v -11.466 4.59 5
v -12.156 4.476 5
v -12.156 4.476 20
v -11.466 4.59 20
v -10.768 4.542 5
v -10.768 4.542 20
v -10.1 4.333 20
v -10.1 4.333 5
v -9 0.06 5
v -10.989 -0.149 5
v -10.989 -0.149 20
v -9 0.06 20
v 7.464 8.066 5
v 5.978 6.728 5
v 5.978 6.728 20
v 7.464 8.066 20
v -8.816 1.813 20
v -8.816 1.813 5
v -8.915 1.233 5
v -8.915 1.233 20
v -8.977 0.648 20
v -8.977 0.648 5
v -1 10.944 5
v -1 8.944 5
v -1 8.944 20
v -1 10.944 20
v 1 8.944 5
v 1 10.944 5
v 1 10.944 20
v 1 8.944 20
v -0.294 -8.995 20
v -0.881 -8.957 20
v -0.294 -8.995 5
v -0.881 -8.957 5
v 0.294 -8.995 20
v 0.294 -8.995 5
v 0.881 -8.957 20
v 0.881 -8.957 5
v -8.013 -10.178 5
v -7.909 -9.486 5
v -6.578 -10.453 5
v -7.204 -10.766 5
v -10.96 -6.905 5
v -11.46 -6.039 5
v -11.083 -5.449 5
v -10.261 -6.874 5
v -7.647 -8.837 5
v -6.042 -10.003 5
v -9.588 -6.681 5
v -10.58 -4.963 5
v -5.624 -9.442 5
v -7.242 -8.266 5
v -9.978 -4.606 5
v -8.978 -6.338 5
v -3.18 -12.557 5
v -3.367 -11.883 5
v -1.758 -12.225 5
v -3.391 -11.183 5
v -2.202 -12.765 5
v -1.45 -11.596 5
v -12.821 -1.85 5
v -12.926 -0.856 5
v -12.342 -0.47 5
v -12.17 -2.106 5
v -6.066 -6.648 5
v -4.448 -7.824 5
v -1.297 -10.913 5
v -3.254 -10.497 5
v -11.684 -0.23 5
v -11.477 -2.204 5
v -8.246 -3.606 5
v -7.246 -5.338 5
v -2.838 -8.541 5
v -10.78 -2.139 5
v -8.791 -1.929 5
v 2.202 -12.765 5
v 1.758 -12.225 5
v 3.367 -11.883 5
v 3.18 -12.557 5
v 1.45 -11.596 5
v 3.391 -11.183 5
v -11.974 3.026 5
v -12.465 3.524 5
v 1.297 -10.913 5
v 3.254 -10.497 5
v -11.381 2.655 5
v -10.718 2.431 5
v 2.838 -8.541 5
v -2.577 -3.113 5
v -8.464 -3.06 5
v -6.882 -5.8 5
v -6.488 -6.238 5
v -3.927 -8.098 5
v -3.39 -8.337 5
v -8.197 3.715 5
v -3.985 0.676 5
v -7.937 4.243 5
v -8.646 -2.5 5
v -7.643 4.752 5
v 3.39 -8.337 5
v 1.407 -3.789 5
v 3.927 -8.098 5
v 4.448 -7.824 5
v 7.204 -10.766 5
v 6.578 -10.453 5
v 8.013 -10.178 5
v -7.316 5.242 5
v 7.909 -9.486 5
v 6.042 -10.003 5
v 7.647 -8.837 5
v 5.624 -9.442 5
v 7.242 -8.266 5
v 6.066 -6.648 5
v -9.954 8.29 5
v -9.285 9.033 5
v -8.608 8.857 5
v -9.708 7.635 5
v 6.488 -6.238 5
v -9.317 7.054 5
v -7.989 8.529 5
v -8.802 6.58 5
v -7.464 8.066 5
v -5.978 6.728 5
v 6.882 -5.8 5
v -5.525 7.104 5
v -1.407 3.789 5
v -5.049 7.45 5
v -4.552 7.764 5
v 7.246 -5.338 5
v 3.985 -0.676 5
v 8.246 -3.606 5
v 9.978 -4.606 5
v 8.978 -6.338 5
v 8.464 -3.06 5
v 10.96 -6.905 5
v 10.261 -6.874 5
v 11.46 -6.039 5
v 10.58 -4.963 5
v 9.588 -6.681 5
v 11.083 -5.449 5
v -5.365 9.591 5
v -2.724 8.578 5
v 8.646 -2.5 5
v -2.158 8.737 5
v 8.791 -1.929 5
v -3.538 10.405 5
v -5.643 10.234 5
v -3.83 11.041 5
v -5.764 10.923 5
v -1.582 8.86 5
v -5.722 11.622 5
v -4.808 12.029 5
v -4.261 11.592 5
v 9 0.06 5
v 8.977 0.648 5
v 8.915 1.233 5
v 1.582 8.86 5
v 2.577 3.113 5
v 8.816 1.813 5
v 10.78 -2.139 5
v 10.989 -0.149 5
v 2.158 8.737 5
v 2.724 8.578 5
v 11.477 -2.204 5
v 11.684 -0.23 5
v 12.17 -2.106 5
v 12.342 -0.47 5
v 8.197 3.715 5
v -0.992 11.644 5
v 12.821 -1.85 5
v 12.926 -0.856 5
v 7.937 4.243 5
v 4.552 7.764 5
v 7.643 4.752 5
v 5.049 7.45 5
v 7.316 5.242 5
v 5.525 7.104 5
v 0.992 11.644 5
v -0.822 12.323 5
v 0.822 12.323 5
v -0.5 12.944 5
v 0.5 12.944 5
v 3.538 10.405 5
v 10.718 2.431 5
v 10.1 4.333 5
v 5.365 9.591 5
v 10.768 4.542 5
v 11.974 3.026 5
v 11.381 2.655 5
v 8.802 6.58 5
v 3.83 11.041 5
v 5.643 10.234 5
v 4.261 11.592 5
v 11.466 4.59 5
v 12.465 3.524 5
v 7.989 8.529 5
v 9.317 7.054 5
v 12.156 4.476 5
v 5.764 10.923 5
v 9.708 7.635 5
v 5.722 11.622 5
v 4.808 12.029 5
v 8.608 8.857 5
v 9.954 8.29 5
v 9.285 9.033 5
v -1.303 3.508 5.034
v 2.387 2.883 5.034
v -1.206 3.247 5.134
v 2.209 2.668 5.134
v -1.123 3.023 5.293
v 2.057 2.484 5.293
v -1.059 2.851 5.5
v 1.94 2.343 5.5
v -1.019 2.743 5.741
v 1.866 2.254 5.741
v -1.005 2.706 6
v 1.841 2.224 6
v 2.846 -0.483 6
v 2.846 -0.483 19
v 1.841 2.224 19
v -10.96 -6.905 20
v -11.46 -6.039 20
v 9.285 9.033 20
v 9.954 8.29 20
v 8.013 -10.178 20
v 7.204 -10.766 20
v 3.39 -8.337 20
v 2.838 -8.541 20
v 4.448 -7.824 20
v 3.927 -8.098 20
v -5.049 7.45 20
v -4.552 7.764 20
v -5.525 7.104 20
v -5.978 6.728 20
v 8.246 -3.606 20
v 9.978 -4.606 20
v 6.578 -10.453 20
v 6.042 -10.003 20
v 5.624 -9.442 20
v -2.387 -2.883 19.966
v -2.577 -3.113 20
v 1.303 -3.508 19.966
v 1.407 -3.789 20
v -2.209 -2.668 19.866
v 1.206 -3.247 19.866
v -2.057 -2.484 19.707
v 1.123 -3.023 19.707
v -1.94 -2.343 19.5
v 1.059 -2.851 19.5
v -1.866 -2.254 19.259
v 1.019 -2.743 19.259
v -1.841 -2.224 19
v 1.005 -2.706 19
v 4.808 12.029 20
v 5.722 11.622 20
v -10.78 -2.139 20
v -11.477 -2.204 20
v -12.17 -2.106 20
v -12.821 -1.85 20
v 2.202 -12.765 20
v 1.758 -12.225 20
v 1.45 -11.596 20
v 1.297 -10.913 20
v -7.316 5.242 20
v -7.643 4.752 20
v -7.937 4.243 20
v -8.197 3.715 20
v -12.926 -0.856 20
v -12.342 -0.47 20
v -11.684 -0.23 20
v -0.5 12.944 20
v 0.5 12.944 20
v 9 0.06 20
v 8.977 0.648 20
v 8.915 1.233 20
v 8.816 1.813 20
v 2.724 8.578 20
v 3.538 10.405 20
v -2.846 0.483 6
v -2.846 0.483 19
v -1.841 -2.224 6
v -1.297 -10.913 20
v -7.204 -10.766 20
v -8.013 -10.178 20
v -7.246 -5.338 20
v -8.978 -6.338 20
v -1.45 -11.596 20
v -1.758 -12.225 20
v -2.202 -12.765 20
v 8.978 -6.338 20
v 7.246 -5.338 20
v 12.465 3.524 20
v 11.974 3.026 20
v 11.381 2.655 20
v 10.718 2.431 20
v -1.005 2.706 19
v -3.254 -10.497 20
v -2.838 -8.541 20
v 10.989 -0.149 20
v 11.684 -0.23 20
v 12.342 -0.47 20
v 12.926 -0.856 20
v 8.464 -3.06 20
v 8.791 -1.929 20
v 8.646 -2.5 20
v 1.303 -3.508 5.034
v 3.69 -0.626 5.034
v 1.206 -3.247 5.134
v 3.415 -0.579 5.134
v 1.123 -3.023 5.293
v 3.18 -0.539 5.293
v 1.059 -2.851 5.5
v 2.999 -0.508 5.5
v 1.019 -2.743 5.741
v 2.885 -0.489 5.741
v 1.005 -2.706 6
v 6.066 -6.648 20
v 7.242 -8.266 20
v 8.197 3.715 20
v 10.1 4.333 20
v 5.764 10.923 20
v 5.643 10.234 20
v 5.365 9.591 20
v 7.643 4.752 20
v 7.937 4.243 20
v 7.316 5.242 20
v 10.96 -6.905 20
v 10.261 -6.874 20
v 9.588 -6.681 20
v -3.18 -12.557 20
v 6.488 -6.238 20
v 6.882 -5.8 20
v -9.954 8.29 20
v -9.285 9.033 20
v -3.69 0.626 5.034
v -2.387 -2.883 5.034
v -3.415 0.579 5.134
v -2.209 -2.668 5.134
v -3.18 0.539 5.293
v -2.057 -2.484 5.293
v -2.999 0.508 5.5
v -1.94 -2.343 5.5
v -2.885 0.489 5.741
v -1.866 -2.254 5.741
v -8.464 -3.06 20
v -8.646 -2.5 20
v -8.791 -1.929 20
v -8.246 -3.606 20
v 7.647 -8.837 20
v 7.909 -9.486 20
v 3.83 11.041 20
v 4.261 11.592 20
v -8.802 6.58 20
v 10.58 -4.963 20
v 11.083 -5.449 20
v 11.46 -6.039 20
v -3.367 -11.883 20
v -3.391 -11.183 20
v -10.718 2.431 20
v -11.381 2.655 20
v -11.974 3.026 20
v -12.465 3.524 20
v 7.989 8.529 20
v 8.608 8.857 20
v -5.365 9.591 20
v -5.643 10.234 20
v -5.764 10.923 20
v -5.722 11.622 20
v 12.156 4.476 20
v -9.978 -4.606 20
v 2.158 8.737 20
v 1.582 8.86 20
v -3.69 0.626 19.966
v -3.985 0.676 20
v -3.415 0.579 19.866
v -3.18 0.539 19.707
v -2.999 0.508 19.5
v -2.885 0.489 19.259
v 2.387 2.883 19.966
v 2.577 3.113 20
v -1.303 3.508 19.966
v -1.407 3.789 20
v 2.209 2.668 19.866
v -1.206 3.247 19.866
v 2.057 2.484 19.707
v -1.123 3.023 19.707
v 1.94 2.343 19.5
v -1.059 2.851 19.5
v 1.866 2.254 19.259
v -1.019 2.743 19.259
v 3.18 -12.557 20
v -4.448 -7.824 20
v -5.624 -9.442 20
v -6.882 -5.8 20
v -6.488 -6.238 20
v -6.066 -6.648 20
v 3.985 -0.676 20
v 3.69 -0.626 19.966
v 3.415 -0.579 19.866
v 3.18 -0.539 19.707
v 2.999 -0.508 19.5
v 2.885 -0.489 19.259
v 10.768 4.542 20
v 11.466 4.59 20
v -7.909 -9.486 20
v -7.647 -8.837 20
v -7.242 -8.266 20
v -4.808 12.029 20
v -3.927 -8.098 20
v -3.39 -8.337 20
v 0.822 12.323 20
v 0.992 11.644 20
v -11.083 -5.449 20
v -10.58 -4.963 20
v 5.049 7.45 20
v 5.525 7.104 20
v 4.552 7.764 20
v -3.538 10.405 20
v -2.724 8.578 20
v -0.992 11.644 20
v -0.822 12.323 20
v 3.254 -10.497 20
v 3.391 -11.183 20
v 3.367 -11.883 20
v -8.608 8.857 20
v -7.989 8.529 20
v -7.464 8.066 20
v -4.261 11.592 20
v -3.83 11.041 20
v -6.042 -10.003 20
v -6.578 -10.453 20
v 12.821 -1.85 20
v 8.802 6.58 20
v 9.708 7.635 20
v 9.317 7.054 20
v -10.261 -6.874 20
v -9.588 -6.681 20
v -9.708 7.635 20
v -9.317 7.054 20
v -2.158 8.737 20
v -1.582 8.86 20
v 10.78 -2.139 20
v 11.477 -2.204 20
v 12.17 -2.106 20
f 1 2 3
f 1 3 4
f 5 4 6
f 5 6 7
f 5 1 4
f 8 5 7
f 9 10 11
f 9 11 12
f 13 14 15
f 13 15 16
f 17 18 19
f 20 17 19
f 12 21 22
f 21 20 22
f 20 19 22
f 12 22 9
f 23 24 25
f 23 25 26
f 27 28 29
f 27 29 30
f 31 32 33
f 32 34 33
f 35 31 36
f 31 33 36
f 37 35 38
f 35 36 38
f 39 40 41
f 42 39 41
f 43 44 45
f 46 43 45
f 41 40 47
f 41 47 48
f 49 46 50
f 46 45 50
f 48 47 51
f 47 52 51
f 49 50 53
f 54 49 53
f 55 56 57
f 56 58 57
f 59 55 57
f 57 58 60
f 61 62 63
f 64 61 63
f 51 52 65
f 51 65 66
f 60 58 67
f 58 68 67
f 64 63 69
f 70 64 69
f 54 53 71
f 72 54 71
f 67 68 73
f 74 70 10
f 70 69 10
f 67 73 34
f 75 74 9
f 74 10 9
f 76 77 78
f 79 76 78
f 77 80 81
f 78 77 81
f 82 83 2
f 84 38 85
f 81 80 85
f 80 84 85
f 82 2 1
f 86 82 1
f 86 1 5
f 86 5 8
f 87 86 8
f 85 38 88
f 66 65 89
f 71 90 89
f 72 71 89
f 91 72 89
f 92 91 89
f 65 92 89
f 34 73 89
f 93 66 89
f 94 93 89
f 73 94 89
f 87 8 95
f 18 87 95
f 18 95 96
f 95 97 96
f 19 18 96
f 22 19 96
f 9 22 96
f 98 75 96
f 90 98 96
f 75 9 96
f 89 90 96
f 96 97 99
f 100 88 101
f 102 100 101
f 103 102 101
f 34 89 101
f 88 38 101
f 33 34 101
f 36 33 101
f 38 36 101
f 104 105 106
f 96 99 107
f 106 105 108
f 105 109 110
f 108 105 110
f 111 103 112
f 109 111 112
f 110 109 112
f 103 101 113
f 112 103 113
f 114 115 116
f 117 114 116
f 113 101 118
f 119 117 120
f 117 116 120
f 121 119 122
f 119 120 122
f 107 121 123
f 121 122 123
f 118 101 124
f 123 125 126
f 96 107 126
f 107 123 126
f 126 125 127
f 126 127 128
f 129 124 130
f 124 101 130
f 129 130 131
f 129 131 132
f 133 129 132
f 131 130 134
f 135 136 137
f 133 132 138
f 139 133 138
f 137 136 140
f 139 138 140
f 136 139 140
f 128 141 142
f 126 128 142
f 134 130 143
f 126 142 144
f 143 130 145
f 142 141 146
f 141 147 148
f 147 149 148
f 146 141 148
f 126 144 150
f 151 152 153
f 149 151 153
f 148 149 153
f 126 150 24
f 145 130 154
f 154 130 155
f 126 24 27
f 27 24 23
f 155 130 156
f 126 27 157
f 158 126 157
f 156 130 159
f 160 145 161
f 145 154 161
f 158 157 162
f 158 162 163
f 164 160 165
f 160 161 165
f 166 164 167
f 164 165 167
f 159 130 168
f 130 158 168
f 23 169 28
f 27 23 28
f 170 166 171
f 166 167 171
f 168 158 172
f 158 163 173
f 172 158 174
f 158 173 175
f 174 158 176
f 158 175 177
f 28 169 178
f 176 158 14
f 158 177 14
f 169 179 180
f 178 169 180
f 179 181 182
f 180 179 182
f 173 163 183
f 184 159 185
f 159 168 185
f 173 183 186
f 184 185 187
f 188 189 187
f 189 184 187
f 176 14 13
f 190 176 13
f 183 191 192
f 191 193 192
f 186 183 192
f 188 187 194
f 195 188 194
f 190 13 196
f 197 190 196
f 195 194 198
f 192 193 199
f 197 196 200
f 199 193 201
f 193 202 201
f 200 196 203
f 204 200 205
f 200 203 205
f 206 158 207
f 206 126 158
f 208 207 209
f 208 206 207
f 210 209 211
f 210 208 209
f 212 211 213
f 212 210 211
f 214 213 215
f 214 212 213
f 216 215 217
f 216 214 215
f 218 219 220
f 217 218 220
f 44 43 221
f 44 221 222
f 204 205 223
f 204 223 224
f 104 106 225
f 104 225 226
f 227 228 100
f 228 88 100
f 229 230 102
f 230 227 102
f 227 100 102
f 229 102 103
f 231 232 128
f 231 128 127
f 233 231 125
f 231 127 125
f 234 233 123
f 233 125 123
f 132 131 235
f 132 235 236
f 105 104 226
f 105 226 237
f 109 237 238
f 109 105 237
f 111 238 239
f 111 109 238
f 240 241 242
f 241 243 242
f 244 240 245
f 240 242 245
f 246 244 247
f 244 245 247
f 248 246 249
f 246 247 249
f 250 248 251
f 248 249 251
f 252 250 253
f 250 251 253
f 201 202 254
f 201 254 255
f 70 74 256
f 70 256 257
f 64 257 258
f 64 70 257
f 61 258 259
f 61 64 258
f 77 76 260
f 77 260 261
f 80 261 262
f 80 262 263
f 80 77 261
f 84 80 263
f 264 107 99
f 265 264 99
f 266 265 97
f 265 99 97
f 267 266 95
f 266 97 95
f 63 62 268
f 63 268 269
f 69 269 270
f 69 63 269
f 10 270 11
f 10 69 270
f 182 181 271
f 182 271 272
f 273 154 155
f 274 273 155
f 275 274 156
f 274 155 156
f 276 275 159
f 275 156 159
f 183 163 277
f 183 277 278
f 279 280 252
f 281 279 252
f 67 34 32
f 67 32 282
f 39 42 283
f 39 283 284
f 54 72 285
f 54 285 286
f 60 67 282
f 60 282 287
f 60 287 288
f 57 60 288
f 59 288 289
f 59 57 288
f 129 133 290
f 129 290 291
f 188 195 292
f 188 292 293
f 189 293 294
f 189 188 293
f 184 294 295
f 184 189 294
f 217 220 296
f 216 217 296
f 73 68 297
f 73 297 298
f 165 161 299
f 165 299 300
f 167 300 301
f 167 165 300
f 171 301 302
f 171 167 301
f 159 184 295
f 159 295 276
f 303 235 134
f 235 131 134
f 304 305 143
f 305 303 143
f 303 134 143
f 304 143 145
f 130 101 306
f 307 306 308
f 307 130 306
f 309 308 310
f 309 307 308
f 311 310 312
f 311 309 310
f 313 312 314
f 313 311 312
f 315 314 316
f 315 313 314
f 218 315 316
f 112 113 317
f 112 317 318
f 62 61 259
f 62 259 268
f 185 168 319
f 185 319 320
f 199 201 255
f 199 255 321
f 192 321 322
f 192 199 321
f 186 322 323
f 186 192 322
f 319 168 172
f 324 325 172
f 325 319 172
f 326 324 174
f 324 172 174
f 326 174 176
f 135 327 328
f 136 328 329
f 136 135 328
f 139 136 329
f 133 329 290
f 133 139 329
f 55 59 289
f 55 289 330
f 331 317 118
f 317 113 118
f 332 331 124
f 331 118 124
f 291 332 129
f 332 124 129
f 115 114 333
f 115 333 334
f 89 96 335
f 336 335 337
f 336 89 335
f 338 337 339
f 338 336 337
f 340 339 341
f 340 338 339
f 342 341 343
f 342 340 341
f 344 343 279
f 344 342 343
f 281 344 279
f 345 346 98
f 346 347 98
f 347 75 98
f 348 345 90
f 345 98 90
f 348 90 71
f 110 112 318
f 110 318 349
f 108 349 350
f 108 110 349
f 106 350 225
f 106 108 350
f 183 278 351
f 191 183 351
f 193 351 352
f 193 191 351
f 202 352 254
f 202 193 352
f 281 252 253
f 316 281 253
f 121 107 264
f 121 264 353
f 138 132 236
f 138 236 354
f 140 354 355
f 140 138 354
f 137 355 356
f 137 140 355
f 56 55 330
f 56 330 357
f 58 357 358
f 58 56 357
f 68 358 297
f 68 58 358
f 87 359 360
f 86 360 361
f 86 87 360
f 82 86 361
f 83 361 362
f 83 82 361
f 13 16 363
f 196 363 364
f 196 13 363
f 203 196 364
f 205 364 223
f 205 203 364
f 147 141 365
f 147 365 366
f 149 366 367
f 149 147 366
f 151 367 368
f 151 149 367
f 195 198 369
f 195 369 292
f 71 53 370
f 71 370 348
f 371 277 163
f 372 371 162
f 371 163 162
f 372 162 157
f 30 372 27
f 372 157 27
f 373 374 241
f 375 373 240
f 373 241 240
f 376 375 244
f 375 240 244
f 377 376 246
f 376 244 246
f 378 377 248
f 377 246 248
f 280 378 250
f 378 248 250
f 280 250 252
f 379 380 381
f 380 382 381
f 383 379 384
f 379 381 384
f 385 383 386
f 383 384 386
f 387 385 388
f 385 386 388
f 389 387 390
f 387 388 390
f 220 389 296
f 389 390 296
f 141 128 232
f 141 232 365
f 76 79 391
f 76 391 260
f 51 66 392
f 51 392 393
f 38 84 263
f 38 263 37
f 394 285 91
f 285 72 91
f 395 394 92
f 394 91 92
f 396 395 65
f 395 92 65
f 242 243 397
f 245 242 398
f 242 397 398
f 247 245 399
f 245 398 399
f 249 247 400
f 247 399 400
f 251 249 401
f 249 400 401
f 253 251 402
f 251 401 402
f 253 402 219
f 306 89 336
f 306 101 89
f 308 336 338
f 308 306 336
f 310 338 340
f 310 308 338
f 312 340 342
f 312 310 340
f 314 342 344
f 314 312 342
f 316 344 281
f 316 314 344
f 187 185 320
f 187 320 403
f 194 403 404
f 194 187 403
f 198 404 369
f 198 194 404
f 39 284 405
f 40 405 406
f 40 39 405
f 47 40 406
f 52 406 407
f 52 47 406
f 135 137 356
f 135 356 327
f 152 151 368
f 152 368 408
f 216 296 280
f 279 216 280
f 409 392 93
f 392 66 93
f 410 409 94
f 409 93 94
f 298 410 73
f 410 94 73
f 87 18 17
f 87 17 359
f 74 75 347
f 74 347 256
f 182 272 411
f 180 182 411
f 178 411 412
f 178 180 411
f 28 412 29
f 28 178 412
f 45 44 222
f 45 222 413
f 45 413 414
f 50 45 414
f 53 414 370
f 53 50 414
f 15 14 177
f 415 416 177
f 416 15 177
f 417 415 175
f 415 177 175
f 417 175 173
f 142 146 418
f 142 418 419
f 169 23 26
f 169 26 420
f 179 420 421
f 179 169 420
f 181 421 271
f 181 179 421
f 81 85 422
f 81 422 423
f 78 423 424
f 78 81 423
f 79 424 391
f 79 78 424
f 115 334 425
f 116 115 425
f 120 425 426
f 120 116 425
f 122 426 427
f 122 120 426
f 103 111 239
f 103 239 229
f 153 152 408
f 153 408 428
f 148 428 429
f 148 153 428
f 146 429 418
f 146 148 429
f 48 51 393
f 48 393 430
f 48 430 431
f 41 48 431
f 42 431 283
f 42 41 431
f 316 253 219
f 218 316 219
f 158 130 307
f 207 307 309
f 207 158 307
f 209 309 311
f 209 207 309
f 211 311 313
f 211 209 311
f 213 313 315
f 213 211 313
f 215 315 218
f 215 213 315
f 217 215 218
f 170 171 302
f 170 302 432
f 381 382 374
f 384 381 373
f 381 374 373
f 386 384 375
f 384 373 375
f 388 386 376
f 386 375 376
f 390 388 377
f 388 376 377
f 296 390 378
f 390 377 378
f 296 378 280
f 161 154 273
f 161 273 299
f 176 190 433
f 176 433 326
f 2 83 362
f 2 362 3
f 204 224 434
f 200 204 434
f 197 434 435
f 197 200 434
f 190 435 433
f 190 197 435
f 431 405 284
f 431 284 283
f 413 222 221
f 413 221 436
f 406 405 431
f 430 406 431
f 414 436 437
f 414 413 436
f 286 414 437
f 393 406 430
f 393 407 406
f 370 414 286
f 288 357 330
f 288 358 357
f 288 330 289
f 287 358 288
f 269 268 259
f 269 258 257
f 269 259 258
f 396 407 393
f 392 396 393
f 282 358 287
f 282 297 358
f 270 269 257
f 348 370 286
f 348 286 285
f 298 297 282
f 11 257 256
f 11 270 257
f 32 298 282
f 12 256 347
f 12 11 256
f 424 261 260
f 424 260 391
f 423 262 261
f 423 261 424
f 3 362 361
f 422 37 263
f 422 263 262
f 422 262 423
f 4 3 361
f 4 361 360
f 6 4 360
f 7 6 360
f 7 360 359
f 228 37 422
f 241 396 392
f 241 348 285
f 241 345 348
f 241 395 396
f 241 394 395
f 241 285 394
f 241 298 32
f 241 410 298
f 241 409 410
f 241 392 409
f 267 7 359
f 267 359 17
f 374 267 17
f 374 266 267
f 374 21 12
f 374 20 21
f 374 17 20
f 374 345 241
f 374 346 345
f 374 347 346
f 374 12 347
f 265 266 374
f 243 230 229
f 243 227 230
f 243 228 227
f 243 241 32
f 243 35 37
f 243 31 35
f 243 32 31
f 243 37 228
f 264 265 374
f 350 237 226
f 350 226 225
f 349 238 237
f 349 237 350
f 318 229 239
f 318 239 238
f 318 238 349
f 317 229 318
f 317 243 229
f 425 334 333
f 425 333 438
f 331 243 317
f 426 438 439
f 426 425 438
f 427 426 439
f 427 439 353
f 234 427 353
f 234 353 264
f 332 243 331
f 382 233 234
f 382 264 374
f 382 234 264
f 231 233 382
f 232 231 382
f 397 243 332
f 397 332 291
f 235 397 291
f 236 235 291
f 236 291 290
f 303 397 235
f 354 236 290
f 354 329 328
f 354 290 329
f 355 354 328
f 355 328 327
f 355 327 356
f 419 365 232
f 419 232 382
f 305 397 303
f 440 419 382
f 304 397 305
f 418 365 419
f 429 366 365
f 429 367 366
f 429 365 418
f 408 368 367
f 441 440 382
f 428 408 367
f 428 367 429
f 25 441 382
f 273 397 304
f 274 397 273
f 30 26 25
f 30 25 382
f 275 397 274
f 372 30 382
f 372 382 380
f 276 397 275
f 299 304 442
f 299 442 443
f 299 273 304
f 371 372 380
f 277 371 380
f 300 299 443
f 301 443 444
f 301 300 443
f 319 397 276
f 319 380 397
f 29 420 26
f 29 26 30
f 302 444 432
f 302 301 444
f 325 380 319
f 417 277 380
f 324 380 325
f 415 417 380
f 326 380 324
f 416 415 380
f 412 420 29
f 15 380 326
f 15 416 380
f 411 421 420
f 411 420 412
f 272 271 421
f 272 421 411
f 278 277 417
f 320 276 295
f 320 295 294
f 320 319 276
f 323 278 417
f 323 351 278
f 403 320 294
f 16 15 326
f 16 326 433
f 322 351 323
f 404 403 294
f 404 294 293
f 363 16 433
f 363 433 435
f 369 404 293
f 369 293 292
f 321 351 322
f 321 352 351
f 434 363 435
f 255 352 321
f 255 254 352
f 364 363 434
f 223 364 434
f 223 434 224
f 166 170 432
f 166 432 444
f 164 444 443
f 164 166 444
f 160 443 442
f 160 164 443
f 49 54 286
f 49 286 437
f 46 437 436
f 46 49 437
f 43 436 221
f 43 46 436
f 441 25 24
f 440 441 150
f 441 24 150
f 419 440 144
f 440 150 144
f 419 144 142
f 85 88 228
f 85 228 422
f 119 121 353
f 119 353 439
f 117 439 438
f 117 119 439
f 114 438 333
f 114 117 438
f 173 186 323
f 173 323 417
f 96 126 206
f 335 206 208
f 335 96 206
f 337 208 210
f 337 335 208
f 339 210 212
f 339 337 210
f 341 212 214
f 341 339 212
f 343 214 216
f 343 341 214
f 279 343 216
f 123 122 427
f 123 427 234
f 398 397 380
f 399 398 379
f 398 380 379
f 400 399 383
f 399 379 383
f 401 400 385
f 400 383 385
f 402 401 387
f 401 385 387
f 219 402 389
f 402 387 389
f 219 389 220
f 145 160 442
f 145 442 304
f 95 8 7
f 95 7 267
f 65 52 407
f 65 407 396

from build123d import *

# Parameters (mm, degrees)
SKETCH1_R                    = 9
SKETCH1_R_2                  = 1
BOSS_EXTRUDE1_DEPTH          = 36
SKETCH5_W                    = 5
SKETCH5_H                    = 4.08502449
SKETCH5_W_2                  = 8
BOSS_EXTRUDE2_DEPTH          = 22
SKETCH7_W                    = 5
SKETCH7_H                    = 4.653899232
CUT_REVOLVE2_ANGLE           = 90
CUT_REVOLVE2_OTHER_WAY_ANGLE = 90
CIRPATTERN1_COUNT            = 15
SKETCH13_W                   = 5
SKETCH13_H                   = 16.616445935
SKETCH17_R                   = 2
CUT_EXTRUDE1_DEPTH           = 10
CUT_EXTRUDE2_DEPTH           = 23
CUT_EXTRUDE2_DEPTH_BACK      = 8
SKETCH20_R                   = 20.157813079
CUT_EXTRUDE3_DEPTH           = 36
FILLET1_R                    = 1


with BuildPart() as part:
    # Sketch1 → Boss-Extrude1 (new body)
    with BuildSketch(Plane.XY):
        Circle(SKETCH1_R)
        Circle(SKETCH1_R_2, mode=Mode.SUBTRACT)
    extrude(amount=BOSS_EXTRUDE1_DEPTH)

    # Sketch5 → Cut-Revolve1 (revolve, cut)
    with BuildSketch(Plane(origin=(0, 0, 0), x_dir=(0, 0, -1), z_dir=(1, 0, 0)), mode=Mode.PRIVATE) as cut_revolve1_sk:
        with Locations((-2.5, 6.957487755)):
            Rectangle(SKETCH5_W, SKETCH5_H)
        with Locations((-32, 6.957487755)):
            Rectangle(SKETCH5_W_2, SKETCH5_H)
    revolve(cut_revolve1_sk.sketch.rotate(Axis((0, 0, 0), (0, 0, 1)), 90), axis=Axis((0, 0, 0), (0, 0, 1)), mode=Mode.SUBTRACT)

    # Sketch6 → Boss-Extrude2 (add)
    with BuildSketch(Plane.XY):
        with BuildLine():
            Line((-1, 8.94427191), (-1, 10.94427191))
            ThreePointArc((-1, 10.94427191), (-0.927189817, 11.988569364), (-0.5, 12.94427191))
            Line((-0.5, 12.94427191), (0.5, 12.94427191))
            ThreePointArc((0.5, 12.94427191), (0.927189817, 11.988569364), (1, 10.94427191))
            Line((1, 10.94427191), (1, 8.94427191))
            Line((1, 8.94427191), (-1, 8.94427191))
        make_face()
    boss_extrude2 = extrude(amount=BOSS_EXTRUDE2_DEPTH)

    # Sketch7 → Cut-Revolve2 (revolve, cut)
    with BuildSketch(Plane(origin=(0, 0, 0), x_dir=(0, 0, -1), z_dir=(1, 0, 0))):
        with Locations((-2.5, 11.271221526)):
            Rectangle(SKETCH7_W, SKETCH7_H)
    revolve(axis=Axis((0, 8.94427191, 5), (0, 0, -1)), revolution_arc=CUT_REVOLVE2_ANGLE, mode=Mode.SUBTRACT)

    # Sketch7 → Cut-Revolve2 other way (revolve, cut)
    with BuildSketch(Plane(origin=(0, 0, 0), x_dir=(0, 0, -1), z_dir=(1, 0, 0))):
        with Locations((-2.5, 11.271221526)):
            Rectangle(SKETCH7_W, SKETCH7_H)
    revolve(axis=Axis((0, 8.94427191, 5), (0, 0, 1)), revolution_arc=CUT_REVOLVE2_OTHER_WAY_ANGLE, mode=Mode.SUBTRACT)

    # CirPattern1: Boss-Extrude2 ×15 about axis
    cirpattern1_axis = Axis((0, 0, 0), (0, 0, 1))
    for i in range(1, CIRPATTERN1_COUNT):
        add(boss_extrude2.rotate(cirpattern1_axis, i * 360 / CIRPATTERN1_COUNT))

    # Sketch13 → Cut-Revolve6 (revolve, cut)
    with BuildSketch(Plane(origin=(0, 0, 0), x_dir=(0, 0, -1), z_dir=(1, 0, 0)), mode=Mode.PRIVATE) as cut_revolve6_sk:
        with Locations((-2.5, 8.308222968)):
            Rectangle(SKETCH13_W, SKETCH13_H)
    revolve(cut_revolve6_sk.sketch.rotate(Axis((0, 0, 25.578402878), (0, 0, -1)), 270), axis=Axis((0, 0, 25.578402878), (0, 0, -1)), mode=Mode.SUBTRACT)

    # Sketch17 → Cut-Extrude1 (cut)
    with BuildSketch(Plane(origin=(0, 0, 0), x_dir=(1, 0, 0), z_dir=(0, 1, 0))):
        with Locations(Location((-0.128741976, -25.11123185, 0), (0, 0, 270))):
            Circle(SKETCH17_R)
    extrude(amount=-CUT_EXTRUDE1_DEPTH, mode=Mode.SUBTRACT)

    # Sketch20 → Cut-Extrude2 (cut, two sides: drawn at the far end of the back side and taken through both)
    with BuildSketch(Plane.XY.offset(28).offset(-CUT_EXTRUDE2_DEPTH_BACK)):
        Circle(SKETCH20_R)
    extrude(amount=CUT_EXTRUDE2_DEPTH + CUT_EXTRUDE2_DEPTH_BACK, mode=Mode.SUBTRACT)

    # Sketch21 → Cut-Extrude3 (cut)
    with BuildSketch(Plane.XY.offset(20)):
        Polygon((1.840953559, 2.223560956), (-1.005183496, 2.706093028), (-2.846137055, 0.482532071), (-1.840953559, -2.223560956), (1.005183496, -2.706093028), (2.846137055, -0.482532071), align=None)
    extrude(amount=-CUT_EXTRUDE3_DEPTH, mode=Mode.SUBTRACT)

    # Fillet1
    fillet1_edges = [part.edges().sort_by_distance(p)[0] for p in [
        (2.343545307, 0.870514443, 5),
        (1.925660275, -1.594312549, 5),
        (-0.417885032, -2.464826992, 5),
        (-2.343545307, -0.870514443, 5),
        (-1.925660275, 1.594312549, 5),
        (0.417885032, 2.464826992, 5),
        (2.343545307, 0.870514443, 20),
        (0.417885032, 2.464826992, 20),
        (-1.925660275, 1.594312549, 20),
        (-2.343545307, -0.870514443, 20),
        (-0.417885032, -2.464826992, 20),
        (1.925660275, -1.594312549, 20),
    ]]
    fillet(fillet1_edges, radius=FILLET1_R)


solid = part.part
